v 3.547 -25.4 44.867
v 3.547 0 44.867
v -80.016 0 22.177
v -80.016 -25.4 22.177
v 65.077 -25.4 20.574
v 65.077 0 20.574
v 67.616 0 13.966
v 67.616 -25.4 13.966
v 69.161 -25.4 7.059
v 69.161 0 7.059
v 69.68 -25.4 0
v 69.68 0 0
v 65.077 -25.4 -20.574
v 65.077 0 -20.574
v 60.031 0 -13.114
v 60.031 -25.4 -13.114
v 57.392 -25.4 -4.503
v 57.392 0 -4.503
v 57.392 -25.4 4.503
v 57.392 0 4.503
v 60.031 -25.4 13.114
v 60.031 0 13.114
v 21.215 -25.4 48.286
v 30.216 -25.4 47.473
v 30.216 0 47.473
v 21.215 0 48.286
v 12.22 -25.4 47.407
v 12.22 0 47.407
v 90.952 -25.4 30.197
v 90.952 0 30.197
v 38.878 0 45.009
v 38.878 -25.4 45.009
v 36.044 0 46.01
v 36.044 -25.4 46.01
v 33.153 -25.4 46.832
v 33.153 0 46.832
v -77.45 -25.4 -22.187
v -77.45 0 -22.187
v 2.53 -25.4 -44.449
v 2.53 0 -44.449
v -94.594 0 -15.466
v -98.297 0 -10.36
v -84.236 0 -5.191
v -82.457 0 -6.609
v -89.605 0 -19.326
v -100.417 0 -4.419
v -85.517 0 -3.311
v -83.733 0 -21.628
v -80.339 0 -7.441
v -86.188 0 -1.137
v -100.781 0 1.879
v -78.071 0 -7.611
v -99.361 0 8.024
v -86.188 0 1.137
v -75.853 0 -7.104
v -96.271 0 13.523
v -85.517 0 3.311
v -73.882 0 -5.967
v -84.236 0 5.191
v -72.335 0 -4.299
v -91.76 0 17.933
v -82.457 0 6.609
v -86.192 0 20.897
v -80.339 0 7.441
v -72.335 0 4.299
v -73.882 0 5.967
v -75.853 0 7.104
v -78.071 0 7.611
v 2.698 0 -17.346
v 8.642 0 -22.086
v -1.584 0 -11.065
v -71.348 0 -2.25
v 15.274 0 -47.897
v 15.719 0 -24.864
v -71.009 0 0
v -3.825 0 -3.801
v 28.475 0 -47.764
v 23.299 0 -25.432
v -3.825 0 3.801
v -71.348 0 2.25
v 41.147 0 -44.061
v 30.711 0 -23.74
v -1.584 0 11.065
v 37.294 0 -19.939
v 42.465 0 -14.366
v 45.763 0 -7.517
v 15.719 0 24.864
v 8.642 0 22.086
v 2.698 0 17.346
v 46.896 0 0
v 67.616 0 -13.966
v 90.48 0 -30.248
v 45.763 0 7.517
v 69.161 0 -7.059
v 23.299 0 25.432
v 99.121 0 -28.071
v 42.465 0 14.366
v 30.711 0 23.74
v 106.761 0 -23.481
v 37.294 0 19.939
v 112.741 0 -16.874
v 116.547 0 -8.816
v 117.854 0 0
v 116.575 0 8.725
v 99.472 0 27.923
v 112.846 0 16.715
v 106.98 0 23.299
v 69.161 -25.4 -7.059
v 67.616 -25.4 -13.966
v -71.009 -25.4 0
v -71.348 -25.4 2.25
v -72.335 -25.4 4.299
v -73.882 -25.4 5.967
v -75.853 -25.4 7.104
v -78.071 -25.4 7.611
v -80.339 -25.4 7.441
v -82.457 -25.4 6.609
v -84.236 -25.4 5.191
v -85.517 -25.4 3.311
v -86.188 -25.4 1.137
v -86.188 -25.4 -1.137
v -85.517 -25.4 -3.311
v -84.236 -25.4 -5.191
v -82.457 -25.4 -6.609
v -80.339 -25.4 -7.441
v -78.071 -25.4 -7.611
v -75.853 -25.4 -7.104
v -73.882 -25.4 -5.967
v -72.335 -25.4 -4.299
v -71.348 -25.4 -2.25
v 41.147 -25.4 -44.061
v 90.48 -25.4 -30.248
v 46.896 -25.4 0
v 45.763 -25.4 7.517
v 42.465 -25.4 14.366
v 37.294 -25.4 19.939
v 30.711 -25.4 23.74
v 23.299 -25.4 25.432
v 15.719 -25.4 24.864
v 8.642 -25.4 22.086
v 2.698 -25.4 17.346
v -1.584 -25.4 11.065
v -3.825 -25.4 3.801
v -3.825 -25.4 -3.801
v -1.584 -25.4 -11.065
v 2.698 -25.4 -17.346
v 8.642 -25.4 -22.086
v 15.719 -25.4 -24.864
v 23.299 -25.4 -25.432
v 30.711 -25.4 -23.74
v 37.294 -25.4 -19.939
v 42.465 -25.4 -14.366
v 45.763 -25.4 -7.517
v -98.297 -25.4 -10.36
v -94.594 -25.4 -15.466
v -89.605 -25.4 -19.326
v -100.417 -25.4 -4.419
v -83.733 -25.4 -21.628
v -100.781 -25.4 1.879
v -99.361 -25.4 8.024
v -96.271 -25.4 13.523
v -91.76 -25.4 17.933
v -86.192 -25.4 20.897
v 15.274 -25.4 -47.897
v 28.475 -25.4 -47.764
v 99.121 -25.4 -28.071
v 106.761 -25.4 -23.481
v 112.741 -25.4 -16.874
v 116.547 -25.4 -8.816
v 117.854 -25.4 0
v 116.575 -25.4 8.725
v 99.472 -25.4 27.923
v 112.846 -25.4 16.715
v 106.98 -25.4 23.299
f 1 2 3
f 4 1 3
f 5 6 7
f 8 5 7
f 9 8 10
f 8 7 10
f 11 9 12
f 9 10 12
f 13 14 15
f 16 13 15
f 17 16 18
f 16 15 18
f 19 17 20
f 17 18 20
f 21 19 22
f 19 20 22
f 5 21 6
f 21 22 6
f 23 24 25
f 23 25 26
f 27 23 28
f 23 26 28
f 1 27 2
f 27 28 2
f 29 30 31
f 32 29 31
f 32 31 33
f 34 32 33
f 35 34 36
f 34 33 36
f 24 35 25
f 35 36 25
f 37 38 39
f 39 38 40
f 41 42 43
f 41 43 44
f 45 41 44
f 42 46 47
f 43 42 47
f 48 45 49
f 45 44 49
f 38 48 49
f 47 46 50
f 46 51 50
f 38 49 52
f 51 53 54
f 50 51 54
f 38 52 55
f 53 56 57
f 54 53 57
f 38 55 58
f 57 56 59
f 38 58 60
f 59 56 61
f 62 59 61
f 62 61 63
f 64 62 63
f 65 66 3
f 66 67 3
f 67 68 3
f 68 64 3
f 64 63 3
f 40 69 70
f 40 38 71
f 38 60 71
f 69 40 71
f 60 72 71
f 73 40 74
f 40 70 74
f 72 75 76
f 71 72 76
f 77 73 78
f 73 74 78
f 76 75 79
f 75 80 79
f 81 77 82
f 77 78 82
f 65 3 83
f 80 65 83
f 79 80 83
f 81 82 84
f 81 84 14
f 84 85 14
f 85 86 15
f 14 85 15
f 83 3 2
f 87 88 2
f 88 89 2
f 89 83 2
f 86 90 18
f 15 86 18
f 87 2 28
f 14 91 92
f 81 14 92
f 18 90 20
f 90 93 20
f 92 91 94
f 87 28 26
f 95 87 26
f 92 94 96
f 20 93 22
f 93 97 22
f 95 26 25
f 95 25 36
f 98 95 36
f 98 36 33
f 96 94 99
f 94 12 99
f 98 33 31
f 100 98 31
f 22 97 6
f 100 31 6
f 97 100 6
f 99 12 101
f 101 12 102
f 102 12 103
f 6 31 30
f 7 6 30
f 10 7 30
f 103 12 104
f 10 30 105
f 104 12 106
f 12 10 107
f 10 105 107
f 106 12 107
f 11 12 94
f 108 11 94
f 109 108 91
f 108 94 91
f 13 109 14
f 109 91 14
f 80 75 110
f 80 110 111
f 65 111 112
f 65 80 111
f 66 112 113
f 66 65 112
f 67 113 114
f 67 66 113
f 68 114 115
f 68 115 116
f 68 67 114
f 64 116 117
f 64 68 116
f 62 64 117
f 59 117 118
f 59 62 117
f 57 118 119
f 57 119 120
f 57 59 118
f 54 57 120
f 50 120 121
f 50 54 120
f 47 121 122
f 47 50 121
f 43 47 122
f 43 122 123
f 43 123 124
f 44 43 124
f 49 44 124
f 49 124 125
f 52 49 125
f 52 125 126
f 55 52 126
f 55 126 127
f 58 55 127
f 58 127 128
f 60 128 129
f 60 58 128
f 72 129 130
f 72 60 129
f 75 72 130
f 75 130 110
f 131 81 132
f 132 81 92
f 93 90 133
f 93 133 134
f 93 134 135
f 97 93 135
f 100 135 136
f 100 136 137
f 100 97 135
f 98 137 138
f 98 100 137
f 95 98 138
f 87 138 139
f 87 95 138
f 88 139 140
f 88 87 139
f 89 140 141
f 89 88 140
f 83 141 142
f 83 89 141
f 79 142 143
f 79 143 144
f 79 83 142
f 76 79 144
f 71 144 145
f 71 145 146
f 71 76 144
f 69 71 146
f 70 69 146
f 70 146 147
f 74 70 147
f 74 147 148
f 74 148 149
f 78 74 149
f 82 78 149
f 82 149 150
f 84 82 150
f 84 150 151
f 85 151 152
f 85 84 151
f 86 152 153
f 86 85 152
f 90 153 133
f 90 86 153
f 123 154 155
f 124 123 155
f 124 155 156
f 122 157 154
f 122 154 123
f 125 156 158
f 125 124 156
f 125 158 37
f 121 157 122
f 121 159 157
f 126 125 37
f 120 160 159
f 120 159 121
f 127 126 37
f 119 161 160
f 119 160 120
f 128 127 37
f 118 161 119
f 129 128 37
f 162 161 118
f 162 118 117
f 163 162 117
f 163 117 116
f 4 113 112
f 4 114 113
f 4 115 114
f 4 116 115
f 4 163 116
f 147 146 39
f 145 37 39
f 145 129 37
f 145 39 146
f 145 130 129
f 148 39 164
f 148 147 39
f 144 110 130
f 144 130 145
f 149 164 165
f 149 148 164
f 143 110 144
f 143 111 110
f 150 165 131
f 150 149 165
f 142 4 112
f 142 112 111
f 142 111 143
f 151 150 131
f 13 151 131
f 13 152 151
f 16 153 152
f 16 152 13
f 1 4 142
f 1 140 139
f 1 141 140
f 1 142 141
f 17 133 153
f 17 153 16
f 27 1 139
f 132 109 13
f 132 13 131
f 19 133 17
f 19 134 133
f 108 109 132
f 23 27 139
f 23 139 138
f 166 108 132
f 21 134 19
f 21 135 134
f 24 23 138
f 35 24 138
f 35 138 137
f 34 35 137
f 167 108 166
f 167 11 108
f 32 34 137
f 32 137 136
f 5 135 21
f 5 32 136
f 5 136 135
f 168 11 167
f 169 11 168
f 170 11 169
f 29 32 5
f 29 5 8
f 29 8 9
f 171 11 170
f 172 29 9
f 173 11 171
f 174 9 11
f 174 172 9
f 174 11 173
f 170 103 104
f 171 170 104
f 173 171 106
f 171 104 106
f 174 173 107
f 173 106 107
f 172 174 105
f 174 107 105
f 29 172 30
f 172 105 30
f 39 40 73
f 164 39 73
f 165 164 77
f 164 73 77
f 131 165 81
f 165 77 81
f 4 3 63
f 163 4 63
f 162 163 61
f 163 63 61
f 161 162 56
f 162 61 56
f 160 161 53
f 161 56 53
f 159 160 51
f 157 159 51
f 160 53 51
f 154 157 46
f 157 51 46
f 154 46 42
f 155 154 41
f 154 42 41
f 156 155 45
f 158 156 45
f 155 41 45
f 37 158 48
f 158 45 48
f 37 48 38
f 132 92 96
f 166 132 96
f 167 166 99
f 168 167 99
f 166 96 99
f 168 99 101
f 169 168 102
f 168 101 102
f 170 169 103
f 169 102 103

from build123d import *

# Parameters (mm, degrees)
F0_R     = 7.631953
F0_R_2   = 25.503006
F1_DEPTH = 25.4


with BuildPart() as f1:
    # F0 (on Front) → F1 (new body)
    with BuildSketch(Plane.XZ):
        with BuildLine():
            ThreePointArc((-77.450006, -22.187467), (-62.513883, -15.284636), (-56.421532, 0))
            ThreePointArc((-56.421532, 0), (-63.423372, 16.190358), (-80.016015, 22.176816))
            ThreePointArc((-80.016015, 22.176816), (-100.82327, -1.283015), (-77.450006, -22.187467))
        make_face()
        with Locations((-78.640938, 0)):
            Circle(F0_R, mode=Mode.SUBTRACT)
        with BuildLine():
            ThreePointArc((-80.016015, 22.176816), (-63.423372, 16.190358), (-56.421532, 0))
            ThreePointArc((-56.421532, 0), (-62.513883, -15.284636), (-77.450006, -22.187467))
            Line((-77.450006, -22.187467), (2.529821, -44.449052))
            ThreePointArc((2.529821, -44.449052), (-26.88959, 0.549721), (3.546719, 44.867014))
            Line((3.546719, 44.867014), (-80.016015, 22.176816))
        make_face()
        with BuildLine():
            ThreePointArc((30.21598, 47.473344), (16.696931, 48.057235), (3.546719, 44.867014))
            ThreePointArc((3.546719, 44.867014), (-26.88959, 0.549721), (2.529821, -44.449052))
            ThreePointArc((2.529821, -44.449052), (21.879089, -48.283738), (41.147314, -44.060645))
            ThreePointArc((41.147314, -44.060645), (55.216447, -34.461004), (65.077302, -20.573703))
            ThreePointArc((65.077302, -20.573703), (57.057115, 0), (65.077302, 20.573703))
            ThreePointArc((65.077302, 20.573703), (54.32786, 35.311196), (38.878237, 45.009308))
            Line((38.878237, 45.009308), (30.21598, 47.473344))
        make_face()
        with Locations((21.393461, 0)):
            Circle(F0_R_2, mode=Mode.SUBTRACT)
        with BuildLine():
            ThreePointArc((38.878237, 45.009308), (34.60468, 46.443717), (30.21598, 47.473344))
            Line((30.21598, 47.473344), (38.878237, 45.009308))
        make_face()
        with BuildLine():
            ThreePointArc((65.077302, -20.573703), (55.216447, -34.461004), (41.147314, -44.060645))
            Line((41.147314, -44.060645), (90.479543, -30.247541))
            ThreePointArc((90.479543, -30.247541), (76.636918, -28.408065), (65.077302, -20.573703))
        make_face()
        with BuildLine():
            Line((90.952081, 30.196563), (38.878237, 45.009308))
            ThreePointArc((38.878237, 45.009308), (54.32786, 35.311196), (65.077302, 20.573703))
            ThreePointArc((65.077302, 20.573703), (76.859329, 28.491771), (90.952081, 30.196563))
        make_face()
        with BuildLine():
            ThreePointArc((69.679641, 0), (68.515011, -10.541096), (65.077302, -20.573703))
            ThreePointArc((65.077302, -20.573703), (76.636918, -28.408065), (90.479543, -30.247541))
            ThreePointArc((90.479543, -30.247541), (109.994154, -20.39769), (117.853788, 0))
            ThreePointArc((117.853788, 0), (110.152925, 20.220869), (90.952081, 30.196563))
            ThreePointArc((90.952081, 30.196563), (76.859329, 28.491771), (65.077302, 20.573703))
            ThreePointArc((65.077302, 20.573703), (68.515011, 10.541096), (69.679641, 0))
        make_face()
    extrude(amount=F1_DEPTH)


solid = f1.part
